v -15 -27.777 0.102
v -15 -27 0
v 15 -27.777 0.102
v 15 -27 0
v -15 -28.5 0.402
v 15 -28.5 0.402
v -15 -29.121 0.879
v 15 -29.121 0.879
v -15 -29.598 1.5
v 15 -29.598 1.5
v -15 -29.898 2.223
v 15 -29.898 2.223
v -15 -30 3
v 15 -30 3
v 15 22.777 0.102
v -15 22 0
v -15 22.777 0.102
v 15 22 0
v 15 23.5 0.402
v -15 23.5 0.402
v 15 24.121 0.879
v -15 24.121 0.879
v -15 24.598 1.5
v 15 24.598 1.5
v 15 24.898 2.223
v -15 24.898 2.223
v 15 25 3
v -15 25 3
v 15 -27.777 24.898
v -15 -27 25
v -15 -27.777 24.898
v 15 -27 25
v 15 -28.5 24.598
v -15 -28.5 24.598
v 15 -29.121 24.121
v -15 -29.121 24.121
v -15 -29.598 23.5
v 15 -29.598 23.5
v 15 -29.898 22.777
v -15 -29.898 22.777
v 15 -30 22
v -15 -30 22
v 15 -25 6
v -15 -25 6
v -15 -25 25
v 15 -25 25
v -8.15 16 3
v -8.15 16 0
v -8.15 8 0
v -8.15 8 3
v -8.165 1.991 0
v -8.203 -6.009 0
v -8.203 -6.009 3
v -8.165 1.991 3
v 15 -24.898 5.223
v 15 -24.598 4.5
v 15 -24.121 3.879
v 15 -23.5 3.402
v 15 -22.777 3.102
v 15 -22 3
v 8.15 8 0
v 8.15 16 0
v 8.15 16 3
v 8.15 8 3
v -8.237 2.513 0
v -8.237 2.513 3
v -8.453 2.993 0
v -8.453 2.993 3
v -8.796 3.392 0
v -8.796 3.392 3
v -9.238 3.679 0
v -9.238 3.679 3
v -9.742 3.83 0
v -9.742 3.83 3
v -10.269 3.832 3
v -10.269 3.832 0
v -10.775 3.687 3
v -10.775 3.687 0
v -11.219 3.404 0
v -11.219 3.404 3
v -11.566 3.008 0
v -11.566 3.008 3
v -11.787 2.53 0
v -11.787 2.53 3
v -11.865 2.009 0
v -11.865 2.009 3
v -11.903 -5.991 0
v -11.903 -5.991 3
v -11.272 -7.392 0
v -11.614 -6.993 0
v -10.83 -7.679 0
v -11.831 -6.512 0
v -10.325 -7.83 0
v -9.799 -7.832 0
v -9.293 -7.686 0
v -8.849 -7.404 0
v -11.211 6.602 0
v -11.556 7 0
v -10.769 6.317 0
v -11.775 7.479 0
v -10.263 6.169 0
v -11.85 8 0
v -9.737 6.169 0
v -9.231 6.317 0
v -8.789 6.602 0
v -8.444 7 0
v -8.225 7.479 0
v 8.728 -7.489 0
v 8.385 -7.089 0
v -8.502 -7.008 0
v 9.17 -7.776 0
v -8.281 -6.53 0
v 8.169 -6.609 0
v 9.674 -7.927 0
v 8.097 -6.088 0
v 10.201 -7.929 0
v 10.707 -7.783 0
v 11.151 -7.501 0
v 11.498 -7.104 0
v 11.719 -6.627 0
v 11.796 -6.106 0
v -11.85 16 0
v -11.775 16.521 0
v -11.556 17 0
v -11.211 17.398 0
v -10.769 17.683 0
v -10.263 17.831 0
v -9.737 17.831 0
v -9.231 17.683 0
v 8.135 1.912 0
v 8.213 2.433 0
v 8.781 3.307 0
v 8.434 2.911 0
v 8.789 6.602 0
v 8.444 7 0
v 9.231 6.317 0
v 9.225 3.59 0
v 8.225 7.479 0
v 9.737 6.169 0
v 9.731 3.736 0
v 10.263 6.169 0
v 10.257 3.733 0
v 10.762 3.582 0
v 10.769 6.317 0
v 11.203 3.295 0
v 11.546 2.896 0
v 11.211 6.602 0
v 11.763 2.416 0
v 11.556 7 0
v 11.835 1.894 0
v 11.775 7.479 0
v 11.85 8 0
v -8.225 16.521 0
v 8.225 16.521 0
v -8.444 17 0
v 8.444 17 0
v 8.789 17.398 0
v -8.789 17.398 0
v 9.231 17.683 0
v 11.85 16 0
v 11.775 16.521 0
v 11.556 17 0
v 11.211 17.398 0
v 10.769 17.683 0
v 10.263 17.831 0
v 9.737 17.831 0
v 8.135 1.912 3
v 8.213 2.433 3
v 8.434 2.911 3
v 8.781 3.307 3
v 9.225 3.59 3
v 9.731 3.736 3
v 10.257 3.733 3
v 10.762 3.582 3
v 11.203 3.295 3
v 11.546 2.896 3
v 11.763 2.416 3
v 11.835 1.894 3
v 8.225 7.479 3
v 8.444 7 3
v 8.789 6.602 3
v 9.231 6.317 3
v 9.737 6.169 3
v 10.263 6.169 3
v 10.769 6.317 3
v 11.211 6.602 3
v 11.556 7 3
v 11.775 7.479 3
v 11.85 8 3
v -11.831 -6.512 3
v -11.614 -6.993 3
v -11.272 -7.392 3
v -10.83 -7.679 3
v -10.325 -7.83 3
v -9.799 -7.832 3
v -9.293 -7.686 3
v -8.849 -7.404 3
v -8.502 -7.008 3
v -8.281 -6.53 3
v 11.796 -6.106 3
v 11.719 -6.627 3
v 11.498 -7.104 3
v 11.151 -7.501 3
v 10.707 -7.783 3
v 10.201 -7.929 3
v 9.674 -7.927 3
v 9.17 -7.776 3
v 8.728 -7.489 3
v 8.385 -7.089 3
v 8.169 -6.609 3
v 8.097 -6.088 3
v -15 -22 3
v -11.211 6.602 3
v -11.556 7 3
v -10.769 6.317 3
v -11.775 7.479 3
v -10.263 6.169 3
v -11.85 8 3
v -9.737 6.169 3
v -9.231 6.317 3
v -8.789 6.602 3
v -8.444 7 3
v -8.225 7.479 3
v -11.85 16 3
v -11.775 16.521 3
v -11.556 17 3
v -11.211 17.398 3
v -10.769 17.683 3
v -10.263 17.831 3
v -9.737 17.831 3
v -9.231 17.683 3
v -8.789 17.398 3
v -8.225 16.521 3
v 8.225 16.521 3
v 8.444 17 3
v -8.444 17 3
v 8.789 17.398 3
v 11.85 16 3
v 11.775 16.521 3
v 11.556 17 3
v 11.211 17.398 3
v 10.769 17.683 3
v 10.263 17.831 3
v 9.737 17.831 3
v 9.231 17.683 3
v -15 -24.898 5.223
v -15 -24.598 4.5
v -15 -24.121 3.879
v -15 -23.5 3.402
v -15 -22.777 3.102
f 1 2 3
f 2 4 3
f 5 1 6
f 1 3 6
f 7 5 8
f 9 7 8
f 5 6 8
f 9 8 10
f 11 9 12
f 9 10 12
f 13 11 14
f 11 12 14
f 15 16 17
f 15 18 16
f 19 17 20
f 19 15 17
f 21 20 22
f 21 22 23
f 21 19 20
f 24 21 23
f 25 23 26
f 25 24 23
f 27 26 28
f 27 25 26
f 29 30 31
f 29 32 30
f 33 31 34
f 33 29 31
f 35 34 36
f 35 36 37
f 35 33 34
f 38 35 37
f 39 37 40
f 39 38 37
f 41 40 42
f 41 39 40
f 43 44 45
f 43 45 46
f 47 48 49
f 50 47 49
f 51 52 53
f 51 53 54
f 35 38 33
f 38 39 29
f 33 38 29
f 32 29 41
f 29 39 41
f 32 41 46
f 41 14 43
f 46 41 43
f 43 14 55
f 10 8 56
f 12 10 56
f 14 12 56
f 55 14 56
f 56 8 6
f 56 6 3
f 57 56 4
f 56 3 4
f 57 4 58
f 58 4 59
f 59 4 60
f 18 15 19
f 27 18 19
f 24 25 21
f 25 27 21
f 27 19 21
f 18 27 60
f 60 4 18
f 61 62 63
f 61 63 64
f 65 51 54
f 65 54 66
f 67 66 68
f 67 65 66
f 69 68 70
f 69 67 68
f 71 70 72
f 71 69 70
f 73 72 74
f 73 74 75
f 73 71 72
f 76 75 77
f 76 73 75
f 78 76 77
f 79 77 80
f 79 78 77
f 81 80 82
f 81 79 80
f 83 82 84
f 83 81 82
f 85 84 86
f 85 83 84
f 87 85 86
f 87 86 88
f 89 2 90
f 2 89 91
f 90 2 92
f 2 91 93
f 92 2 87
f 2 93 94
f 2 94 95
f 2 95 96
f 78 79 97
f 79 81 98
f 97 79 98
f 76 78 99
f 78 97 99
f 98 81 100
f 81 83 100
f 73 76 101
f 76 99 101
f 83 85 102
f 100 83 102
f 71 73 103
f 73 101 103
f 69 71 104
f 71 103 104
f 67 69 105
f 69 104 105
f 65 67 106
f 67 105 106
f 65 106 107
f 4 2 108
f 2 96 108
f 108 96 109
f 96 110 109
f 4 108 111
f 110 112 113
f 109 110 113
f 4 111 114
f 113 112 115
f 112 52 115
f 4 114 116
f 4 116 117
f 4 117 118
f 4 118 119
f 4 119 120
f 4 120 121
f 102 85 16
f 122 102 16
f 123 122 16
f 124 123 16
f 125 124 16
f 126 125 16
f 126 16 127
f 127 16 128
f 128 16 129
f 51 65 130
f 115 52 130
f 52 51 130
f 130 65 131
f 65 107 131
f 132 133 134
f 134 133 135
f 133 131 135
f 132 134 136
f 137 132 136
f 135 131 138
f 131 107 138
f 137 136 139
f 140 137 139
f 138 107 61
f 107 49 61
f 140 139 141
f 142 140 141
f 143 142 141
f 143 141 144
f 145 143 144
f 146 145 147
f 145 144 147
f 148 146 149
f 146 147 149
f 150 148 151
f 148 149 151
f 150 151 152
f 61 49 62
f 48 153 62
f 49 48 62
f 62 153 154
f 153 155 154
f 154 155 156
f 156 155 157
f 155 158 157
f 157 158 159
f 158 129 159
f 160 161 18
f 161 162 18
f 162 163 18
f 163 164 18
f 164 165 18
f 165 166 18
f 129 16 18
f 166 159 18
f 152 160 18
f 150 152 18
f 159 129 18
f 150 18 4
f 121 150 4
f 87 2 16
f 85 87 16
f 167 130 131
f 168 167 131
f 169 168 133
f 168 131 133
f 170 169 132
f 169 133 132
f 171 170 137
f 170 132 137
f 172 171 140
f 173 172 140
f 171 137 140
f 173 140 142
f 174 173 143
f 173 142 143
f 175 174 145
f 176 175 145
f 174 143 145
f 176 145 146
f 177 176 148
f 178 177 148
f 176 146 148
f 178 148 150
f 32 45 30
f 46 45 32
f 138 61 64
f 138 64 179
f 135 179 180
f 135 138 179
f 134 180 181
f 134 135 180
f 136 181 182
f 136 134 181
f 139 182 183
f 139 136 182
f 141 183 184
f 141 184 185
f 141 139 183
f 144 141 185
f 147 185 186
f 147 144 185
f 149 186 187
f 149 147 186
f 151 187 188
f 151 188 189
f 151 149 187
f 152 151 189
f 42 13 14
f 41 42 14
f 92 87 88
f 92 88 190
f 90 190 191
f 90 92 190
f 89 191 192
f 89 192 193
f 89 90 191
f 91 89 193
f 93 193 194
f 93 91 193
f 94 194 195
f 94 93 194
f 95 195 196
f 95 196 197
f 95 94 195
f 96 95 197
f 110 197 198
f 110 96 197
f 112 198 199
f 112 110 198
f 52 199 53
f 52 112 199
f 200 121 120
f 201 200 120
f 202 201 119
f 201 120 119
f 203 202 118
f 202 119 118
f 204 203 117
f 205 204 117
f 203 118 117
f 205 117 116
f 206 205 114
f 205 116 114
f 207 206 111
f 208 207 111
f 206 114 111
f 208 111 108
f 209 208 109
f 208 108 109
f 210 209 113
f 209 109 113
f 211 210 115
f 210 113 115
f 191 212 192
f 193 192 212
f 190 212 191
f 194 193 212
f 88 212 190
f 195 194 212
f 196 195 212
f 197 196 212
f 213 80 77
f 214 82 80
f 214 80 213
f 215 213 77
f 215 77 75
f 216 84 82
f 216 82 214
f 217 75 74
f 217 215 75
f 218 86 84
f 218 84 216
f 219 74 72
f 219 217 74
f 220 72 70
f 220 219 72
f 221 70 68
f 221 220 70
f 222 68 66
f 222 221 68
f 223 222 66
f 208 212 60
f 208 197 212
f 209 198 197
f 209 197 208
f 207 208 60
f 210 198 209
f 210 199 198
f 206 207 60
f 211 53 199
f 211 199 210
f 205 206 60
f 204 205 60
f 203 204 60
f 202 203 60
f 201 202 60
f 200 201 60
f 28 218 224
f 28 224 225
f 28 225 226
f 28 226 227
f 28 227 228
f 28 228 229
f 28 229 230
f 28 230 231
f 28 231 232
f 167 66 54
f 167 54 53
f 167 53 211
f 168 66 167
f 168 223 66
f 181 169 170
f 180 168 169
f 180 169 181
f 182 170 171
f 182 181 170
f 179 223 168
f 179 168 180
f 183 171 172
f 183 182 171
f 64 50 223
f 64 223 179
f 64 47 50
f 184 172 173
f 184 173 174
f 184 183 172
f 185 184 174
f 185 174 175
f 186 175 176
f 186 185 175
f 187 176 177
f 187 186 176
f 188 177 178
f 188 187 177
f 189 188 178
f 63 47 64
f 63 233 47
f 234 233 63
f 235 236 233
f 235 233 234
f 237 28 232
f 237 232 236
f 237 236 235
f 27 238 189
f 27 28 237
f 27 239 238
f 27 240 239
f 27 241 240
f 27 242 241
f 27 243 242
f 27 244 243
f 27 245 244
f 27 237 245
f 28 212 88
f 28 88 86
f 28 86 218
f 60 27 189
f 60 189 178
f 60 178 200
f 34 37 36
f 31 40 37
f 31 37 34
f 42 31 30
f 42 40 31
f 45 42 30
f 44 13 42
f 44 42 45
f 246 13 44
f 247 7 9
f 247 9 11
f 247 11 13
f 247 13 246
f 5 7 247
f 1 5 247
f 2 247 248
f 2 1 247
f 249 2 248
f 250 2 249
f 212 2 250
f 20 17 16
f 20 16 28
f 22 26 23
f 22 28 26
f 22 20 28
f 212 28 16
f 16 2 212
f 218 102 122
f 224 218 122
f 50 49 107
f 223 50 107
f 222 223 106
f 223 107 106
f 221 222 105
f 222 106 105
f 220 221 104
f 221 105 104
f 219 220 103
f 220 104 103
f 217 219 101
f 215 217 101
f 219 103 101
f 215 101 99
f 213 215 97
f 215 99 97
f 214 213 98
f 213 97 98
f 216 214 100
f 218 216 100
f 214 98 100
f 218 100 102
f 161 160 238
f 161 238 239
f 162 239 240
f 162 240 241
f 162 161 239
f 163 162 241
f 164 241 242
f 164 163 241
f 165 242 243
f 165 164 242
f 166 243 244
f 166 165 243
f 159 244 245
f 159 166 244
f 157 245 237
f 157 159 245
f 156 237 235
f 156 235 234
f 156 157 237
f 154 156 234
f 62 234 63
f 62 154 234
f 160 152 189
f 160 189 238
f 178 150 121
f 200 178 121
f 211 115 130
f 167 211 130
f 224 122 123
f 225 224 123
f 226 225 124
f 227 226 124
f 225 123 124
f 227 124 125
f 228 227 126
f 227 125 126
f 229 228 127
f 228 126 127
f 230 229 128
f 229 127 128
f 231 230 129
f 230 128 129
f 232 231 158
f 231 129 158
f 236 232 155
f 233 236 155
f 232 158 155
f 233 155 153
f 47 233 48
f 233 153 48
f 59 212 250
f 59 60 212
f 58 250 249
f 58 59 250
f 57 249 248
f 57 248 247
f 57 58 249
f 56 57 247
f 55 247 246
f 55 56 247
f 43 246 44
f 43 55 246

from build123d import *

# Parameters (mm, degrees)
SKETCH1_W           = 30
SKETCH1_H           = 50
BOSS_EXTRUDE1_DEPTH = 3
SKETCH2_W           = 30
SKETCH2_H           = 5
BOSS_EXTRUDE2_DEPTH = 25
FILLET1_R           = 3


with BuildPart() as part:
    # Sketch1 → Boss-Extrude1 (new body)
    with BuildSketch(Plane.XY):
        Rectangle(SKETCH1_W, SKETCH1_H)
        with BuildLine():
            Line((-11.85, 8), (-11.85, 16))
            ThreePointArc((-11.85, 16), (-10, 17.85), (-8.15, 16))
            Line((-8.15, 16), (-8.15, 8))
            ThreePointArc((-8.15, 8), (-10, 6.15), (-11.85, 8))
        make_face(mode=Mode.SUBTRACT)
        with BuildLine():
            Line((11.85, 8), (11.85, 16))
            ThreePointArc((11.85, 16), (10, 17.85), (8.15, 16))
            Line((8.15, 16), (8.15, 8))
            ThreePointArc((8.15, 8), (10, 6.15), (11.85, 8))
        make_face(mode=Mode.SUBTRACT)
        with BuildLine():
            Line((11.835217348, 1.894233852), (11.796480023, -6.105672361))
            ThreePointArc((11.796480023, -6.105672361), (9.937543705, -7.946692666), (8.0965234, -6.087756348))
            Line((8.0965234, -6.087756348), (8.135260724, 1.912149865))
            ThreePointArc((8.135260724, 1.912149865), (9.994197043, 3.75317017), (11.835217348, 1.894233852))
        make_face(mode=Mode.SUBTRACT)
        with BuildLine():
            Line((-11.864504809, 2.008993176), (-11.903242133, -5.990913037))
            ThreePointArc((-11.903242133, -5.990913037), (-10.062221828, -7.849849355), (-8.203285509, -6.008829049))
            Line((-8.203285509, -6.008829049), (-8.164548185, 1.991077164))
            ThreePointArc((-8.164548185, 1.991077164), (-10.00556849, 3.850013482), (-11.864504809, 2.008993176))
        make_face(mode=Mode.SUBTRACT)
    extrude(amount=BOSS_EXTRUDE1_DEPTH)

    # Sketch2 → Boss-Extrude2 (add)
    with BuildSketch(Plane.XY):
        with Locations((0, -27.5)):
            Rectangle(SKETCH2_W, SKETCH2_H)
    extrude(amount=BOSS_EXTRUDE2_DEPTH)

    # Fillet1
    fillet1_edges = [part.edges().sort_by_distance(p)[0] for p in [
        (0, -30, 25),
        (0, -30, 0),
        (0, -25, 3),
        (0, 25, 0),
    ]]
    fillet(fillet1_edges, radius=FILLET1_R - 0.0001)  # a hair under: the kernel refuses the full size


solid = part.part
